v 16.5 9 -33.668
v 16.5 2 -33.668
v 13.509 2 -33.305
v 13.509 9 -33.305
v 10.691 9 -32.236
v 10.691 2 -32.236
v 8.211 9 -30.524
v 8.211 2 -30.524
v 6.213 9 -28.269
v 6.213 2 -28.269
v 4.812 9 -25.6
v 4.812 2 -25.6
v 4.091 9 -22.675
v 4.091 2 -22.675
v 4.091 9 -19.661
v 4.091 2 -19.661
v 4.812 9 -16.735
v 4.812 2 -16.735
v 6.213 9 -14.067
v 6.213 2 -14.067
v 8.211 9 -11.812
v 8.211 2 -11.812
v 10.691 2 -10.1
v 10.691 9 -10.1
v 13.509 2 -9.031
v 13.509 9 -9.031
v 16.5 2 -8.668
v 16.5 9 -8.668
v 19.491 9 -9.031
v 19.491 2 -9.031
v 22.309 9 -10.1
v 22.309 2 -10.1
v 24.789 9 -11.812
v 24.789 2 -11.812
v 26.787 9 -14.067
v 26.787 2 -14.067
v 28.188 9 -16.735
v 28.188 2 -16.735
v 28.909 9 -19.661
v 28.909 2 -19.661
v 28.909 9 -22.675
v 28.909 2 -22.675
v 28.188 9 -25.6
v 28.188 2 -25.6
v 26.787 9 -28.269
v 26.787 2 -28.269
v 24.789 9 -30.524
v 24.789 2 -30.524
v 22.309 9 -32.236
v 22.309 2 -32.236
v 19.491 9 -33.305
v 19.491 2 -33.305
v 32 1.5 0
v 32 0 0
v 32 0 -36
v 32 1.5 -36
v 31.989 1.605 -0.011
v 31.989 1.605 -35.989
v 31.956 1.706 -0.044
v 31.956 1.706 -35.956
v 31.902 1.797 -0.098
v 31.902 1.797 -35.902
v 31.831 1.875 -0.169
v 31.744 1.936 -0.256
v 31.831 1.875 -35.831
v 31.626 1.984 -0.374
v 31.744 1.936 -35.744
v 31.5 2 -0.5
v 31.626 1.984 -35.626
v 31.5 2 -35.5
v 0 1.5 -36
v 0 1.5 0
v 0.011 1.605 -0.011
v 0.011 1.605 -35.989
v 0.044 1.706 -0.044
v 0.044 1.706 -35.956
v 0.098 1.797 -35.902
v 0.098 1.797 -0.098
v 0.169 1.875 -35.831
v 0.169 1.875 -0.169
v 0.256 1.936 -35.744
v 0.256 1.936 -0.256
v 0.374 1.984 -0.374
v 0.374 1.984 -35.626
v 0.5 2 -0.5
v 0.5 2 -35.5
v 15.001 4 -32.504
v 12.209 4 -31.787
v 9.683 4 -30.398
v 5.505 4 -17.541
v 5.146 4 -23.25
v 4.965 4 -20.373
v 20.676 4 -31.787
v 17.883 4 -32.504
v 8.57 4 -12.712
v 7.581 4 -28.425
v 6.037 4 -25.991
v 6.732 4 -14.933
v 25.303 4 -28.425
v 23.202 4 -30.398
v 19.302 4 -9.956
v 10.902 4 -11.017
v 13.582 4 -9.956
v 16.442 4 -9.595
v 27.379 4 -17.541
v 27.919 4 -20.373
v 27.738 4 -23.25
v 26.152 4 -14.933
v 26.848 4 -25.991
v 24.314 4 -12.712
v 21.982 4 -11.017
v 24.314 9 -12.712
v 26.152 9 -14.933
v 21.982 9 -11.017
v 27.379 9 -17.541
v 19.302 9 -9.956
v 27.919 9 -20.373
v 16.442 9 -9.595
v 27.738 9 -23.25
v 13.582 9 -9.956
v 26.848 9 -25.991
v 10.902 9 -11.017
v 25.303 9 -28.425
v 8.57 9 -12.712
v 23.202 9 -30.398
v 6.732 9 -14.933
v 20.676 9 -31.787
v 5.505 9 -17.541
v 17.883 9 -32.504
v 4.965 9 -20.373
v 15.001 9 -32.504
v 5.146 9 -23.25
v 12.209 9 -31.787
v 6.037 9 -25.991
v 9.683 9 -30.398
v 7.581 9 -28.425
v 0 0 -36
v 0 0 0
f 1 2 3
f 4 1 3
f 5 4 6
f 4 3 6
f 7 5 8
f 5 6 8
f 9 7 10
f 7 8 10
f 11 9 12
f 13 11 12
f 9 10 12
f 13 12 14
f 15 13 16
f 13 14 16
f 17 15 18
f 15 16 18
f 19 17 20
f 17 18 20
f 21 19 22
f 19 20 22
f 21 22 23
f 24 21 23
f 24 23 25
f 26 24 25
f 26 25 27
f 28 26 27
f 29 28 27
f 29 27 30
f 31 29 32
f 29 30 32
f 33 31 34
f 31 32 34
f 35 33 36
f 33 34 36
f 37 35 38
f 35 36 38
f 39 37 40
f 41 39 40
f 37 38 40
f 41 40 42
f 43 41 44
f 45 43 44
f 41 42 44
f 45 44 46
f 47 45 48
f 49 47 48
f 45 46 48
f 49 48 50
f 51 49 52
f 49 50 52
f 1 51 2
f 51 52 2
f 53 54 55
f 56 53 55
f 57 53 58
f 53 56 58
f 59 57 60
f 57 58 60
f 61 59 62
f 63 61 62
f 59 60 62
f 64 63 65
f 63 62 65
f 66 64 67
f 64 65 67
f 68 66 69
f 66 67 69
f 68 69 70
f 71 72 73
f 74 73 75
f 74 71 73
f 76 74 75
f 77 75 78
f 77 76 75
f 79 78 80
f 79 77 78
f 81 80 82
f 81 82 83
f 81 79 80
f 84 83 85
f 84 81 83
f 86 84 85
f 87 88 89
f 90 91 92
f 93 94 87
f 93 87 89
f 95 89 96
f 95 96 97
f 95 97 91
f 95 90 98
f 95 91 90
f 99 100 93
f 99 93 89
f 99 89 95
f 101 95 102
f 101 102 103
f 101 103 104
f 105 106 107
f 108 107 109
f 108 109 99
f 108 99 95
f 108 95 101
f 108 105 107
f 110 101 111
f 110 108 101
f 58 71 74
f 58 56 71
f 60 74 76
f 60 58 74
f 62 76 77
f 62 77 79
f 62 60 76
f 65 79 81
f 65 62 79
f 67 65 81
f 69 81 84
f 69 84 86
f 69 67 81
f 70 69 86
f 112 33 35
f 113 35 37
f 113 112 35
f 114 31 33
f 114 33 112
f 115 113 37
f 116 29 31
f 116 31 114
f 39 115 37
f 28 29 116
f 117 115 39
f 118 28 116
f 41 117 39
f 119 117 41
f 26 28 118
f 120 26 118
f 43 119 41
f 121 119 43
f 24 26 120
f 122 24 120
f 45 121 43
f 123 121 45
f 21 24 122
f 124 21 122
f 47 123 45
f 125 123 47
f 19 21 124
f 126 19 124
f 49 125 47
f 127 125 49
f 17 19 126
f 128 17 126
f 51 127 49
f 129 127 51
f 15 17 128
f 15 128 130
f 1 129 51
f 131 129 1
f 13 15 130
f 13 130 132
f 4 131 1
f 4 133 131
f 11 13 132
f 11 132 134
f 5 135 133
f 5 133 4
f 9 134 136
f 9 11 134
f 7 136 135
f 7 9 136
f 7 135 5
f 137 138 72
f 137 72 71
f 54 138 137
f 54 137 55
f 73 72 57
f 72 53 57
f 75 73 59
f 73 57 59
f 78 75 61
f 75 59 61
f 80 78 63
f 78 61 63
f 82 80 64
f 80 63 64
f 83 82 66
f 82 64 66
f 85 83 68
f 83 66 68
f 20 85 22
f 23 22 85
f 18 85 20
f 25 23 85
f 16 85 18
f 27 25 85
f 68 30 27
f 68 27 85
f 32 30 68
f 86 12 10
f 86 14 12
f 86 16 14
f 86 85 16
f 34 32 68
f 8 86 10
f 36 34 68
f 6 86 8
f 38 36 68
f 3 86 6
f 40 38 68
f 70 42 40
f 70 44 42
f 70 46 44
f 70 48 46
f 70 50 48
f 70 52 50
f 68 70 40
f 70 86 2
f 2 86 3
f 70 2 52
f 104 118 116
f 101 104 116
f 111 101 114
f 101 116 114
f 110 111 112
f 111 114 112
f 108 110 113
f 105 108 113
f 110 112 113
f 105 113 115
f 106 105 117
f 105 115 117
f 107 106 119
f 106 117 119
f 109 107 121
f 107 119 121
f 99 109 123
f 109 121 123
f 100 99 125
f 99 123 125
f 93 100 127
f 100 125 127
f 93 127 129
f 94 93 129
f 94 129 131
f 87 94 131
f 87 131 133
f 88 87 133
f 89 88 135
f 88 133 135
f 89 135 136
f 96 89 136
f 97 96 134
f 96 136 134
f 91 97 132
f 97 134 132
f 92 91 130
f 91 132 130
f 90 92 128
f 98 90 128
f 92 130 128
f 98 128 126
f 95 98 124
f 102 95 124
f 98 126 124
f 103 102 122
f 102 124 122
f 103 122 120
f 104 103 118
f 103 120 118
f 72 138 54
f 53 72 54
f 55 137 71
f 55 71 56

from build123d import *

# Parameters (mm, degrees)
SKETCH_1_W          = 32
SKETCH_1_H          = 36
EXTRUDE_1_DEPTH     = 2
FILLET_3_R          = 0.5
SKETCH_2_R          = 12.5
EXTRUDE_2_DEPTH     = 7
SKETCH_3_R          = 11.5
SKETCH_3_R_2        = 0.070206985
CUT_EXTRUDE_1_DEPTH = 5


with BuildPart() as part:
    # 草图1 → 凸台-拉伸1 (new body)
    with BuildSketch(Plane(origin=(0, 0, 0), x_dir=(1, 0, 0), z_dir=(0, 1, 0))):
        with Locations((16, 18)):
            Rectangle(SKETCH_1_W, SKETCH_1_H)
    extrude(amount=EXTRUDE_1_DEPTH)

    # 圆角3
    fillet_3_edges = [part.edges().sort_by_distance(p)[0] for p in [
        (32, 2, -18),
        (16, 2, -36),
        (0, 2, -18),
        (16, 2, 0),
    ]]
    fillet(fillet_3_edges, radius=FILLET_3_R)

    # 草图2 → 凸台-拉伸2 (add)
    with BuildSketch(Plane(origin=(0, 2, 0), x_dir=(1, 0, 0), z_dir=(0, 1, 0))):
        with Locations(Location((16.5, 21.167902567, 0), (0, 0, 90))):
            Circle(SKETCH_2_R)
    extrude(amount=EXTRUDE_2_DEPTH)

    # 草图3 → 切除-拉伸1 (cut)
    with BuildSketch(Plane(origin=(0, 9, 0), x_dir=(1, 0, 0), z_dir=(0, 1, 0))):
        with Locations(Location((16.442109052, 21.094763366, 0), (0, 0, 270))):
            Circle(SKETCH_3_R)
        with Locations((0, 24.191575331)):
            Circle(SKETCH_3_R_2)
    extrude(amount=-CUT_EXTRUDE_1_DEPTH, mode=Mode.SUBTRACT)


solid = part.part
